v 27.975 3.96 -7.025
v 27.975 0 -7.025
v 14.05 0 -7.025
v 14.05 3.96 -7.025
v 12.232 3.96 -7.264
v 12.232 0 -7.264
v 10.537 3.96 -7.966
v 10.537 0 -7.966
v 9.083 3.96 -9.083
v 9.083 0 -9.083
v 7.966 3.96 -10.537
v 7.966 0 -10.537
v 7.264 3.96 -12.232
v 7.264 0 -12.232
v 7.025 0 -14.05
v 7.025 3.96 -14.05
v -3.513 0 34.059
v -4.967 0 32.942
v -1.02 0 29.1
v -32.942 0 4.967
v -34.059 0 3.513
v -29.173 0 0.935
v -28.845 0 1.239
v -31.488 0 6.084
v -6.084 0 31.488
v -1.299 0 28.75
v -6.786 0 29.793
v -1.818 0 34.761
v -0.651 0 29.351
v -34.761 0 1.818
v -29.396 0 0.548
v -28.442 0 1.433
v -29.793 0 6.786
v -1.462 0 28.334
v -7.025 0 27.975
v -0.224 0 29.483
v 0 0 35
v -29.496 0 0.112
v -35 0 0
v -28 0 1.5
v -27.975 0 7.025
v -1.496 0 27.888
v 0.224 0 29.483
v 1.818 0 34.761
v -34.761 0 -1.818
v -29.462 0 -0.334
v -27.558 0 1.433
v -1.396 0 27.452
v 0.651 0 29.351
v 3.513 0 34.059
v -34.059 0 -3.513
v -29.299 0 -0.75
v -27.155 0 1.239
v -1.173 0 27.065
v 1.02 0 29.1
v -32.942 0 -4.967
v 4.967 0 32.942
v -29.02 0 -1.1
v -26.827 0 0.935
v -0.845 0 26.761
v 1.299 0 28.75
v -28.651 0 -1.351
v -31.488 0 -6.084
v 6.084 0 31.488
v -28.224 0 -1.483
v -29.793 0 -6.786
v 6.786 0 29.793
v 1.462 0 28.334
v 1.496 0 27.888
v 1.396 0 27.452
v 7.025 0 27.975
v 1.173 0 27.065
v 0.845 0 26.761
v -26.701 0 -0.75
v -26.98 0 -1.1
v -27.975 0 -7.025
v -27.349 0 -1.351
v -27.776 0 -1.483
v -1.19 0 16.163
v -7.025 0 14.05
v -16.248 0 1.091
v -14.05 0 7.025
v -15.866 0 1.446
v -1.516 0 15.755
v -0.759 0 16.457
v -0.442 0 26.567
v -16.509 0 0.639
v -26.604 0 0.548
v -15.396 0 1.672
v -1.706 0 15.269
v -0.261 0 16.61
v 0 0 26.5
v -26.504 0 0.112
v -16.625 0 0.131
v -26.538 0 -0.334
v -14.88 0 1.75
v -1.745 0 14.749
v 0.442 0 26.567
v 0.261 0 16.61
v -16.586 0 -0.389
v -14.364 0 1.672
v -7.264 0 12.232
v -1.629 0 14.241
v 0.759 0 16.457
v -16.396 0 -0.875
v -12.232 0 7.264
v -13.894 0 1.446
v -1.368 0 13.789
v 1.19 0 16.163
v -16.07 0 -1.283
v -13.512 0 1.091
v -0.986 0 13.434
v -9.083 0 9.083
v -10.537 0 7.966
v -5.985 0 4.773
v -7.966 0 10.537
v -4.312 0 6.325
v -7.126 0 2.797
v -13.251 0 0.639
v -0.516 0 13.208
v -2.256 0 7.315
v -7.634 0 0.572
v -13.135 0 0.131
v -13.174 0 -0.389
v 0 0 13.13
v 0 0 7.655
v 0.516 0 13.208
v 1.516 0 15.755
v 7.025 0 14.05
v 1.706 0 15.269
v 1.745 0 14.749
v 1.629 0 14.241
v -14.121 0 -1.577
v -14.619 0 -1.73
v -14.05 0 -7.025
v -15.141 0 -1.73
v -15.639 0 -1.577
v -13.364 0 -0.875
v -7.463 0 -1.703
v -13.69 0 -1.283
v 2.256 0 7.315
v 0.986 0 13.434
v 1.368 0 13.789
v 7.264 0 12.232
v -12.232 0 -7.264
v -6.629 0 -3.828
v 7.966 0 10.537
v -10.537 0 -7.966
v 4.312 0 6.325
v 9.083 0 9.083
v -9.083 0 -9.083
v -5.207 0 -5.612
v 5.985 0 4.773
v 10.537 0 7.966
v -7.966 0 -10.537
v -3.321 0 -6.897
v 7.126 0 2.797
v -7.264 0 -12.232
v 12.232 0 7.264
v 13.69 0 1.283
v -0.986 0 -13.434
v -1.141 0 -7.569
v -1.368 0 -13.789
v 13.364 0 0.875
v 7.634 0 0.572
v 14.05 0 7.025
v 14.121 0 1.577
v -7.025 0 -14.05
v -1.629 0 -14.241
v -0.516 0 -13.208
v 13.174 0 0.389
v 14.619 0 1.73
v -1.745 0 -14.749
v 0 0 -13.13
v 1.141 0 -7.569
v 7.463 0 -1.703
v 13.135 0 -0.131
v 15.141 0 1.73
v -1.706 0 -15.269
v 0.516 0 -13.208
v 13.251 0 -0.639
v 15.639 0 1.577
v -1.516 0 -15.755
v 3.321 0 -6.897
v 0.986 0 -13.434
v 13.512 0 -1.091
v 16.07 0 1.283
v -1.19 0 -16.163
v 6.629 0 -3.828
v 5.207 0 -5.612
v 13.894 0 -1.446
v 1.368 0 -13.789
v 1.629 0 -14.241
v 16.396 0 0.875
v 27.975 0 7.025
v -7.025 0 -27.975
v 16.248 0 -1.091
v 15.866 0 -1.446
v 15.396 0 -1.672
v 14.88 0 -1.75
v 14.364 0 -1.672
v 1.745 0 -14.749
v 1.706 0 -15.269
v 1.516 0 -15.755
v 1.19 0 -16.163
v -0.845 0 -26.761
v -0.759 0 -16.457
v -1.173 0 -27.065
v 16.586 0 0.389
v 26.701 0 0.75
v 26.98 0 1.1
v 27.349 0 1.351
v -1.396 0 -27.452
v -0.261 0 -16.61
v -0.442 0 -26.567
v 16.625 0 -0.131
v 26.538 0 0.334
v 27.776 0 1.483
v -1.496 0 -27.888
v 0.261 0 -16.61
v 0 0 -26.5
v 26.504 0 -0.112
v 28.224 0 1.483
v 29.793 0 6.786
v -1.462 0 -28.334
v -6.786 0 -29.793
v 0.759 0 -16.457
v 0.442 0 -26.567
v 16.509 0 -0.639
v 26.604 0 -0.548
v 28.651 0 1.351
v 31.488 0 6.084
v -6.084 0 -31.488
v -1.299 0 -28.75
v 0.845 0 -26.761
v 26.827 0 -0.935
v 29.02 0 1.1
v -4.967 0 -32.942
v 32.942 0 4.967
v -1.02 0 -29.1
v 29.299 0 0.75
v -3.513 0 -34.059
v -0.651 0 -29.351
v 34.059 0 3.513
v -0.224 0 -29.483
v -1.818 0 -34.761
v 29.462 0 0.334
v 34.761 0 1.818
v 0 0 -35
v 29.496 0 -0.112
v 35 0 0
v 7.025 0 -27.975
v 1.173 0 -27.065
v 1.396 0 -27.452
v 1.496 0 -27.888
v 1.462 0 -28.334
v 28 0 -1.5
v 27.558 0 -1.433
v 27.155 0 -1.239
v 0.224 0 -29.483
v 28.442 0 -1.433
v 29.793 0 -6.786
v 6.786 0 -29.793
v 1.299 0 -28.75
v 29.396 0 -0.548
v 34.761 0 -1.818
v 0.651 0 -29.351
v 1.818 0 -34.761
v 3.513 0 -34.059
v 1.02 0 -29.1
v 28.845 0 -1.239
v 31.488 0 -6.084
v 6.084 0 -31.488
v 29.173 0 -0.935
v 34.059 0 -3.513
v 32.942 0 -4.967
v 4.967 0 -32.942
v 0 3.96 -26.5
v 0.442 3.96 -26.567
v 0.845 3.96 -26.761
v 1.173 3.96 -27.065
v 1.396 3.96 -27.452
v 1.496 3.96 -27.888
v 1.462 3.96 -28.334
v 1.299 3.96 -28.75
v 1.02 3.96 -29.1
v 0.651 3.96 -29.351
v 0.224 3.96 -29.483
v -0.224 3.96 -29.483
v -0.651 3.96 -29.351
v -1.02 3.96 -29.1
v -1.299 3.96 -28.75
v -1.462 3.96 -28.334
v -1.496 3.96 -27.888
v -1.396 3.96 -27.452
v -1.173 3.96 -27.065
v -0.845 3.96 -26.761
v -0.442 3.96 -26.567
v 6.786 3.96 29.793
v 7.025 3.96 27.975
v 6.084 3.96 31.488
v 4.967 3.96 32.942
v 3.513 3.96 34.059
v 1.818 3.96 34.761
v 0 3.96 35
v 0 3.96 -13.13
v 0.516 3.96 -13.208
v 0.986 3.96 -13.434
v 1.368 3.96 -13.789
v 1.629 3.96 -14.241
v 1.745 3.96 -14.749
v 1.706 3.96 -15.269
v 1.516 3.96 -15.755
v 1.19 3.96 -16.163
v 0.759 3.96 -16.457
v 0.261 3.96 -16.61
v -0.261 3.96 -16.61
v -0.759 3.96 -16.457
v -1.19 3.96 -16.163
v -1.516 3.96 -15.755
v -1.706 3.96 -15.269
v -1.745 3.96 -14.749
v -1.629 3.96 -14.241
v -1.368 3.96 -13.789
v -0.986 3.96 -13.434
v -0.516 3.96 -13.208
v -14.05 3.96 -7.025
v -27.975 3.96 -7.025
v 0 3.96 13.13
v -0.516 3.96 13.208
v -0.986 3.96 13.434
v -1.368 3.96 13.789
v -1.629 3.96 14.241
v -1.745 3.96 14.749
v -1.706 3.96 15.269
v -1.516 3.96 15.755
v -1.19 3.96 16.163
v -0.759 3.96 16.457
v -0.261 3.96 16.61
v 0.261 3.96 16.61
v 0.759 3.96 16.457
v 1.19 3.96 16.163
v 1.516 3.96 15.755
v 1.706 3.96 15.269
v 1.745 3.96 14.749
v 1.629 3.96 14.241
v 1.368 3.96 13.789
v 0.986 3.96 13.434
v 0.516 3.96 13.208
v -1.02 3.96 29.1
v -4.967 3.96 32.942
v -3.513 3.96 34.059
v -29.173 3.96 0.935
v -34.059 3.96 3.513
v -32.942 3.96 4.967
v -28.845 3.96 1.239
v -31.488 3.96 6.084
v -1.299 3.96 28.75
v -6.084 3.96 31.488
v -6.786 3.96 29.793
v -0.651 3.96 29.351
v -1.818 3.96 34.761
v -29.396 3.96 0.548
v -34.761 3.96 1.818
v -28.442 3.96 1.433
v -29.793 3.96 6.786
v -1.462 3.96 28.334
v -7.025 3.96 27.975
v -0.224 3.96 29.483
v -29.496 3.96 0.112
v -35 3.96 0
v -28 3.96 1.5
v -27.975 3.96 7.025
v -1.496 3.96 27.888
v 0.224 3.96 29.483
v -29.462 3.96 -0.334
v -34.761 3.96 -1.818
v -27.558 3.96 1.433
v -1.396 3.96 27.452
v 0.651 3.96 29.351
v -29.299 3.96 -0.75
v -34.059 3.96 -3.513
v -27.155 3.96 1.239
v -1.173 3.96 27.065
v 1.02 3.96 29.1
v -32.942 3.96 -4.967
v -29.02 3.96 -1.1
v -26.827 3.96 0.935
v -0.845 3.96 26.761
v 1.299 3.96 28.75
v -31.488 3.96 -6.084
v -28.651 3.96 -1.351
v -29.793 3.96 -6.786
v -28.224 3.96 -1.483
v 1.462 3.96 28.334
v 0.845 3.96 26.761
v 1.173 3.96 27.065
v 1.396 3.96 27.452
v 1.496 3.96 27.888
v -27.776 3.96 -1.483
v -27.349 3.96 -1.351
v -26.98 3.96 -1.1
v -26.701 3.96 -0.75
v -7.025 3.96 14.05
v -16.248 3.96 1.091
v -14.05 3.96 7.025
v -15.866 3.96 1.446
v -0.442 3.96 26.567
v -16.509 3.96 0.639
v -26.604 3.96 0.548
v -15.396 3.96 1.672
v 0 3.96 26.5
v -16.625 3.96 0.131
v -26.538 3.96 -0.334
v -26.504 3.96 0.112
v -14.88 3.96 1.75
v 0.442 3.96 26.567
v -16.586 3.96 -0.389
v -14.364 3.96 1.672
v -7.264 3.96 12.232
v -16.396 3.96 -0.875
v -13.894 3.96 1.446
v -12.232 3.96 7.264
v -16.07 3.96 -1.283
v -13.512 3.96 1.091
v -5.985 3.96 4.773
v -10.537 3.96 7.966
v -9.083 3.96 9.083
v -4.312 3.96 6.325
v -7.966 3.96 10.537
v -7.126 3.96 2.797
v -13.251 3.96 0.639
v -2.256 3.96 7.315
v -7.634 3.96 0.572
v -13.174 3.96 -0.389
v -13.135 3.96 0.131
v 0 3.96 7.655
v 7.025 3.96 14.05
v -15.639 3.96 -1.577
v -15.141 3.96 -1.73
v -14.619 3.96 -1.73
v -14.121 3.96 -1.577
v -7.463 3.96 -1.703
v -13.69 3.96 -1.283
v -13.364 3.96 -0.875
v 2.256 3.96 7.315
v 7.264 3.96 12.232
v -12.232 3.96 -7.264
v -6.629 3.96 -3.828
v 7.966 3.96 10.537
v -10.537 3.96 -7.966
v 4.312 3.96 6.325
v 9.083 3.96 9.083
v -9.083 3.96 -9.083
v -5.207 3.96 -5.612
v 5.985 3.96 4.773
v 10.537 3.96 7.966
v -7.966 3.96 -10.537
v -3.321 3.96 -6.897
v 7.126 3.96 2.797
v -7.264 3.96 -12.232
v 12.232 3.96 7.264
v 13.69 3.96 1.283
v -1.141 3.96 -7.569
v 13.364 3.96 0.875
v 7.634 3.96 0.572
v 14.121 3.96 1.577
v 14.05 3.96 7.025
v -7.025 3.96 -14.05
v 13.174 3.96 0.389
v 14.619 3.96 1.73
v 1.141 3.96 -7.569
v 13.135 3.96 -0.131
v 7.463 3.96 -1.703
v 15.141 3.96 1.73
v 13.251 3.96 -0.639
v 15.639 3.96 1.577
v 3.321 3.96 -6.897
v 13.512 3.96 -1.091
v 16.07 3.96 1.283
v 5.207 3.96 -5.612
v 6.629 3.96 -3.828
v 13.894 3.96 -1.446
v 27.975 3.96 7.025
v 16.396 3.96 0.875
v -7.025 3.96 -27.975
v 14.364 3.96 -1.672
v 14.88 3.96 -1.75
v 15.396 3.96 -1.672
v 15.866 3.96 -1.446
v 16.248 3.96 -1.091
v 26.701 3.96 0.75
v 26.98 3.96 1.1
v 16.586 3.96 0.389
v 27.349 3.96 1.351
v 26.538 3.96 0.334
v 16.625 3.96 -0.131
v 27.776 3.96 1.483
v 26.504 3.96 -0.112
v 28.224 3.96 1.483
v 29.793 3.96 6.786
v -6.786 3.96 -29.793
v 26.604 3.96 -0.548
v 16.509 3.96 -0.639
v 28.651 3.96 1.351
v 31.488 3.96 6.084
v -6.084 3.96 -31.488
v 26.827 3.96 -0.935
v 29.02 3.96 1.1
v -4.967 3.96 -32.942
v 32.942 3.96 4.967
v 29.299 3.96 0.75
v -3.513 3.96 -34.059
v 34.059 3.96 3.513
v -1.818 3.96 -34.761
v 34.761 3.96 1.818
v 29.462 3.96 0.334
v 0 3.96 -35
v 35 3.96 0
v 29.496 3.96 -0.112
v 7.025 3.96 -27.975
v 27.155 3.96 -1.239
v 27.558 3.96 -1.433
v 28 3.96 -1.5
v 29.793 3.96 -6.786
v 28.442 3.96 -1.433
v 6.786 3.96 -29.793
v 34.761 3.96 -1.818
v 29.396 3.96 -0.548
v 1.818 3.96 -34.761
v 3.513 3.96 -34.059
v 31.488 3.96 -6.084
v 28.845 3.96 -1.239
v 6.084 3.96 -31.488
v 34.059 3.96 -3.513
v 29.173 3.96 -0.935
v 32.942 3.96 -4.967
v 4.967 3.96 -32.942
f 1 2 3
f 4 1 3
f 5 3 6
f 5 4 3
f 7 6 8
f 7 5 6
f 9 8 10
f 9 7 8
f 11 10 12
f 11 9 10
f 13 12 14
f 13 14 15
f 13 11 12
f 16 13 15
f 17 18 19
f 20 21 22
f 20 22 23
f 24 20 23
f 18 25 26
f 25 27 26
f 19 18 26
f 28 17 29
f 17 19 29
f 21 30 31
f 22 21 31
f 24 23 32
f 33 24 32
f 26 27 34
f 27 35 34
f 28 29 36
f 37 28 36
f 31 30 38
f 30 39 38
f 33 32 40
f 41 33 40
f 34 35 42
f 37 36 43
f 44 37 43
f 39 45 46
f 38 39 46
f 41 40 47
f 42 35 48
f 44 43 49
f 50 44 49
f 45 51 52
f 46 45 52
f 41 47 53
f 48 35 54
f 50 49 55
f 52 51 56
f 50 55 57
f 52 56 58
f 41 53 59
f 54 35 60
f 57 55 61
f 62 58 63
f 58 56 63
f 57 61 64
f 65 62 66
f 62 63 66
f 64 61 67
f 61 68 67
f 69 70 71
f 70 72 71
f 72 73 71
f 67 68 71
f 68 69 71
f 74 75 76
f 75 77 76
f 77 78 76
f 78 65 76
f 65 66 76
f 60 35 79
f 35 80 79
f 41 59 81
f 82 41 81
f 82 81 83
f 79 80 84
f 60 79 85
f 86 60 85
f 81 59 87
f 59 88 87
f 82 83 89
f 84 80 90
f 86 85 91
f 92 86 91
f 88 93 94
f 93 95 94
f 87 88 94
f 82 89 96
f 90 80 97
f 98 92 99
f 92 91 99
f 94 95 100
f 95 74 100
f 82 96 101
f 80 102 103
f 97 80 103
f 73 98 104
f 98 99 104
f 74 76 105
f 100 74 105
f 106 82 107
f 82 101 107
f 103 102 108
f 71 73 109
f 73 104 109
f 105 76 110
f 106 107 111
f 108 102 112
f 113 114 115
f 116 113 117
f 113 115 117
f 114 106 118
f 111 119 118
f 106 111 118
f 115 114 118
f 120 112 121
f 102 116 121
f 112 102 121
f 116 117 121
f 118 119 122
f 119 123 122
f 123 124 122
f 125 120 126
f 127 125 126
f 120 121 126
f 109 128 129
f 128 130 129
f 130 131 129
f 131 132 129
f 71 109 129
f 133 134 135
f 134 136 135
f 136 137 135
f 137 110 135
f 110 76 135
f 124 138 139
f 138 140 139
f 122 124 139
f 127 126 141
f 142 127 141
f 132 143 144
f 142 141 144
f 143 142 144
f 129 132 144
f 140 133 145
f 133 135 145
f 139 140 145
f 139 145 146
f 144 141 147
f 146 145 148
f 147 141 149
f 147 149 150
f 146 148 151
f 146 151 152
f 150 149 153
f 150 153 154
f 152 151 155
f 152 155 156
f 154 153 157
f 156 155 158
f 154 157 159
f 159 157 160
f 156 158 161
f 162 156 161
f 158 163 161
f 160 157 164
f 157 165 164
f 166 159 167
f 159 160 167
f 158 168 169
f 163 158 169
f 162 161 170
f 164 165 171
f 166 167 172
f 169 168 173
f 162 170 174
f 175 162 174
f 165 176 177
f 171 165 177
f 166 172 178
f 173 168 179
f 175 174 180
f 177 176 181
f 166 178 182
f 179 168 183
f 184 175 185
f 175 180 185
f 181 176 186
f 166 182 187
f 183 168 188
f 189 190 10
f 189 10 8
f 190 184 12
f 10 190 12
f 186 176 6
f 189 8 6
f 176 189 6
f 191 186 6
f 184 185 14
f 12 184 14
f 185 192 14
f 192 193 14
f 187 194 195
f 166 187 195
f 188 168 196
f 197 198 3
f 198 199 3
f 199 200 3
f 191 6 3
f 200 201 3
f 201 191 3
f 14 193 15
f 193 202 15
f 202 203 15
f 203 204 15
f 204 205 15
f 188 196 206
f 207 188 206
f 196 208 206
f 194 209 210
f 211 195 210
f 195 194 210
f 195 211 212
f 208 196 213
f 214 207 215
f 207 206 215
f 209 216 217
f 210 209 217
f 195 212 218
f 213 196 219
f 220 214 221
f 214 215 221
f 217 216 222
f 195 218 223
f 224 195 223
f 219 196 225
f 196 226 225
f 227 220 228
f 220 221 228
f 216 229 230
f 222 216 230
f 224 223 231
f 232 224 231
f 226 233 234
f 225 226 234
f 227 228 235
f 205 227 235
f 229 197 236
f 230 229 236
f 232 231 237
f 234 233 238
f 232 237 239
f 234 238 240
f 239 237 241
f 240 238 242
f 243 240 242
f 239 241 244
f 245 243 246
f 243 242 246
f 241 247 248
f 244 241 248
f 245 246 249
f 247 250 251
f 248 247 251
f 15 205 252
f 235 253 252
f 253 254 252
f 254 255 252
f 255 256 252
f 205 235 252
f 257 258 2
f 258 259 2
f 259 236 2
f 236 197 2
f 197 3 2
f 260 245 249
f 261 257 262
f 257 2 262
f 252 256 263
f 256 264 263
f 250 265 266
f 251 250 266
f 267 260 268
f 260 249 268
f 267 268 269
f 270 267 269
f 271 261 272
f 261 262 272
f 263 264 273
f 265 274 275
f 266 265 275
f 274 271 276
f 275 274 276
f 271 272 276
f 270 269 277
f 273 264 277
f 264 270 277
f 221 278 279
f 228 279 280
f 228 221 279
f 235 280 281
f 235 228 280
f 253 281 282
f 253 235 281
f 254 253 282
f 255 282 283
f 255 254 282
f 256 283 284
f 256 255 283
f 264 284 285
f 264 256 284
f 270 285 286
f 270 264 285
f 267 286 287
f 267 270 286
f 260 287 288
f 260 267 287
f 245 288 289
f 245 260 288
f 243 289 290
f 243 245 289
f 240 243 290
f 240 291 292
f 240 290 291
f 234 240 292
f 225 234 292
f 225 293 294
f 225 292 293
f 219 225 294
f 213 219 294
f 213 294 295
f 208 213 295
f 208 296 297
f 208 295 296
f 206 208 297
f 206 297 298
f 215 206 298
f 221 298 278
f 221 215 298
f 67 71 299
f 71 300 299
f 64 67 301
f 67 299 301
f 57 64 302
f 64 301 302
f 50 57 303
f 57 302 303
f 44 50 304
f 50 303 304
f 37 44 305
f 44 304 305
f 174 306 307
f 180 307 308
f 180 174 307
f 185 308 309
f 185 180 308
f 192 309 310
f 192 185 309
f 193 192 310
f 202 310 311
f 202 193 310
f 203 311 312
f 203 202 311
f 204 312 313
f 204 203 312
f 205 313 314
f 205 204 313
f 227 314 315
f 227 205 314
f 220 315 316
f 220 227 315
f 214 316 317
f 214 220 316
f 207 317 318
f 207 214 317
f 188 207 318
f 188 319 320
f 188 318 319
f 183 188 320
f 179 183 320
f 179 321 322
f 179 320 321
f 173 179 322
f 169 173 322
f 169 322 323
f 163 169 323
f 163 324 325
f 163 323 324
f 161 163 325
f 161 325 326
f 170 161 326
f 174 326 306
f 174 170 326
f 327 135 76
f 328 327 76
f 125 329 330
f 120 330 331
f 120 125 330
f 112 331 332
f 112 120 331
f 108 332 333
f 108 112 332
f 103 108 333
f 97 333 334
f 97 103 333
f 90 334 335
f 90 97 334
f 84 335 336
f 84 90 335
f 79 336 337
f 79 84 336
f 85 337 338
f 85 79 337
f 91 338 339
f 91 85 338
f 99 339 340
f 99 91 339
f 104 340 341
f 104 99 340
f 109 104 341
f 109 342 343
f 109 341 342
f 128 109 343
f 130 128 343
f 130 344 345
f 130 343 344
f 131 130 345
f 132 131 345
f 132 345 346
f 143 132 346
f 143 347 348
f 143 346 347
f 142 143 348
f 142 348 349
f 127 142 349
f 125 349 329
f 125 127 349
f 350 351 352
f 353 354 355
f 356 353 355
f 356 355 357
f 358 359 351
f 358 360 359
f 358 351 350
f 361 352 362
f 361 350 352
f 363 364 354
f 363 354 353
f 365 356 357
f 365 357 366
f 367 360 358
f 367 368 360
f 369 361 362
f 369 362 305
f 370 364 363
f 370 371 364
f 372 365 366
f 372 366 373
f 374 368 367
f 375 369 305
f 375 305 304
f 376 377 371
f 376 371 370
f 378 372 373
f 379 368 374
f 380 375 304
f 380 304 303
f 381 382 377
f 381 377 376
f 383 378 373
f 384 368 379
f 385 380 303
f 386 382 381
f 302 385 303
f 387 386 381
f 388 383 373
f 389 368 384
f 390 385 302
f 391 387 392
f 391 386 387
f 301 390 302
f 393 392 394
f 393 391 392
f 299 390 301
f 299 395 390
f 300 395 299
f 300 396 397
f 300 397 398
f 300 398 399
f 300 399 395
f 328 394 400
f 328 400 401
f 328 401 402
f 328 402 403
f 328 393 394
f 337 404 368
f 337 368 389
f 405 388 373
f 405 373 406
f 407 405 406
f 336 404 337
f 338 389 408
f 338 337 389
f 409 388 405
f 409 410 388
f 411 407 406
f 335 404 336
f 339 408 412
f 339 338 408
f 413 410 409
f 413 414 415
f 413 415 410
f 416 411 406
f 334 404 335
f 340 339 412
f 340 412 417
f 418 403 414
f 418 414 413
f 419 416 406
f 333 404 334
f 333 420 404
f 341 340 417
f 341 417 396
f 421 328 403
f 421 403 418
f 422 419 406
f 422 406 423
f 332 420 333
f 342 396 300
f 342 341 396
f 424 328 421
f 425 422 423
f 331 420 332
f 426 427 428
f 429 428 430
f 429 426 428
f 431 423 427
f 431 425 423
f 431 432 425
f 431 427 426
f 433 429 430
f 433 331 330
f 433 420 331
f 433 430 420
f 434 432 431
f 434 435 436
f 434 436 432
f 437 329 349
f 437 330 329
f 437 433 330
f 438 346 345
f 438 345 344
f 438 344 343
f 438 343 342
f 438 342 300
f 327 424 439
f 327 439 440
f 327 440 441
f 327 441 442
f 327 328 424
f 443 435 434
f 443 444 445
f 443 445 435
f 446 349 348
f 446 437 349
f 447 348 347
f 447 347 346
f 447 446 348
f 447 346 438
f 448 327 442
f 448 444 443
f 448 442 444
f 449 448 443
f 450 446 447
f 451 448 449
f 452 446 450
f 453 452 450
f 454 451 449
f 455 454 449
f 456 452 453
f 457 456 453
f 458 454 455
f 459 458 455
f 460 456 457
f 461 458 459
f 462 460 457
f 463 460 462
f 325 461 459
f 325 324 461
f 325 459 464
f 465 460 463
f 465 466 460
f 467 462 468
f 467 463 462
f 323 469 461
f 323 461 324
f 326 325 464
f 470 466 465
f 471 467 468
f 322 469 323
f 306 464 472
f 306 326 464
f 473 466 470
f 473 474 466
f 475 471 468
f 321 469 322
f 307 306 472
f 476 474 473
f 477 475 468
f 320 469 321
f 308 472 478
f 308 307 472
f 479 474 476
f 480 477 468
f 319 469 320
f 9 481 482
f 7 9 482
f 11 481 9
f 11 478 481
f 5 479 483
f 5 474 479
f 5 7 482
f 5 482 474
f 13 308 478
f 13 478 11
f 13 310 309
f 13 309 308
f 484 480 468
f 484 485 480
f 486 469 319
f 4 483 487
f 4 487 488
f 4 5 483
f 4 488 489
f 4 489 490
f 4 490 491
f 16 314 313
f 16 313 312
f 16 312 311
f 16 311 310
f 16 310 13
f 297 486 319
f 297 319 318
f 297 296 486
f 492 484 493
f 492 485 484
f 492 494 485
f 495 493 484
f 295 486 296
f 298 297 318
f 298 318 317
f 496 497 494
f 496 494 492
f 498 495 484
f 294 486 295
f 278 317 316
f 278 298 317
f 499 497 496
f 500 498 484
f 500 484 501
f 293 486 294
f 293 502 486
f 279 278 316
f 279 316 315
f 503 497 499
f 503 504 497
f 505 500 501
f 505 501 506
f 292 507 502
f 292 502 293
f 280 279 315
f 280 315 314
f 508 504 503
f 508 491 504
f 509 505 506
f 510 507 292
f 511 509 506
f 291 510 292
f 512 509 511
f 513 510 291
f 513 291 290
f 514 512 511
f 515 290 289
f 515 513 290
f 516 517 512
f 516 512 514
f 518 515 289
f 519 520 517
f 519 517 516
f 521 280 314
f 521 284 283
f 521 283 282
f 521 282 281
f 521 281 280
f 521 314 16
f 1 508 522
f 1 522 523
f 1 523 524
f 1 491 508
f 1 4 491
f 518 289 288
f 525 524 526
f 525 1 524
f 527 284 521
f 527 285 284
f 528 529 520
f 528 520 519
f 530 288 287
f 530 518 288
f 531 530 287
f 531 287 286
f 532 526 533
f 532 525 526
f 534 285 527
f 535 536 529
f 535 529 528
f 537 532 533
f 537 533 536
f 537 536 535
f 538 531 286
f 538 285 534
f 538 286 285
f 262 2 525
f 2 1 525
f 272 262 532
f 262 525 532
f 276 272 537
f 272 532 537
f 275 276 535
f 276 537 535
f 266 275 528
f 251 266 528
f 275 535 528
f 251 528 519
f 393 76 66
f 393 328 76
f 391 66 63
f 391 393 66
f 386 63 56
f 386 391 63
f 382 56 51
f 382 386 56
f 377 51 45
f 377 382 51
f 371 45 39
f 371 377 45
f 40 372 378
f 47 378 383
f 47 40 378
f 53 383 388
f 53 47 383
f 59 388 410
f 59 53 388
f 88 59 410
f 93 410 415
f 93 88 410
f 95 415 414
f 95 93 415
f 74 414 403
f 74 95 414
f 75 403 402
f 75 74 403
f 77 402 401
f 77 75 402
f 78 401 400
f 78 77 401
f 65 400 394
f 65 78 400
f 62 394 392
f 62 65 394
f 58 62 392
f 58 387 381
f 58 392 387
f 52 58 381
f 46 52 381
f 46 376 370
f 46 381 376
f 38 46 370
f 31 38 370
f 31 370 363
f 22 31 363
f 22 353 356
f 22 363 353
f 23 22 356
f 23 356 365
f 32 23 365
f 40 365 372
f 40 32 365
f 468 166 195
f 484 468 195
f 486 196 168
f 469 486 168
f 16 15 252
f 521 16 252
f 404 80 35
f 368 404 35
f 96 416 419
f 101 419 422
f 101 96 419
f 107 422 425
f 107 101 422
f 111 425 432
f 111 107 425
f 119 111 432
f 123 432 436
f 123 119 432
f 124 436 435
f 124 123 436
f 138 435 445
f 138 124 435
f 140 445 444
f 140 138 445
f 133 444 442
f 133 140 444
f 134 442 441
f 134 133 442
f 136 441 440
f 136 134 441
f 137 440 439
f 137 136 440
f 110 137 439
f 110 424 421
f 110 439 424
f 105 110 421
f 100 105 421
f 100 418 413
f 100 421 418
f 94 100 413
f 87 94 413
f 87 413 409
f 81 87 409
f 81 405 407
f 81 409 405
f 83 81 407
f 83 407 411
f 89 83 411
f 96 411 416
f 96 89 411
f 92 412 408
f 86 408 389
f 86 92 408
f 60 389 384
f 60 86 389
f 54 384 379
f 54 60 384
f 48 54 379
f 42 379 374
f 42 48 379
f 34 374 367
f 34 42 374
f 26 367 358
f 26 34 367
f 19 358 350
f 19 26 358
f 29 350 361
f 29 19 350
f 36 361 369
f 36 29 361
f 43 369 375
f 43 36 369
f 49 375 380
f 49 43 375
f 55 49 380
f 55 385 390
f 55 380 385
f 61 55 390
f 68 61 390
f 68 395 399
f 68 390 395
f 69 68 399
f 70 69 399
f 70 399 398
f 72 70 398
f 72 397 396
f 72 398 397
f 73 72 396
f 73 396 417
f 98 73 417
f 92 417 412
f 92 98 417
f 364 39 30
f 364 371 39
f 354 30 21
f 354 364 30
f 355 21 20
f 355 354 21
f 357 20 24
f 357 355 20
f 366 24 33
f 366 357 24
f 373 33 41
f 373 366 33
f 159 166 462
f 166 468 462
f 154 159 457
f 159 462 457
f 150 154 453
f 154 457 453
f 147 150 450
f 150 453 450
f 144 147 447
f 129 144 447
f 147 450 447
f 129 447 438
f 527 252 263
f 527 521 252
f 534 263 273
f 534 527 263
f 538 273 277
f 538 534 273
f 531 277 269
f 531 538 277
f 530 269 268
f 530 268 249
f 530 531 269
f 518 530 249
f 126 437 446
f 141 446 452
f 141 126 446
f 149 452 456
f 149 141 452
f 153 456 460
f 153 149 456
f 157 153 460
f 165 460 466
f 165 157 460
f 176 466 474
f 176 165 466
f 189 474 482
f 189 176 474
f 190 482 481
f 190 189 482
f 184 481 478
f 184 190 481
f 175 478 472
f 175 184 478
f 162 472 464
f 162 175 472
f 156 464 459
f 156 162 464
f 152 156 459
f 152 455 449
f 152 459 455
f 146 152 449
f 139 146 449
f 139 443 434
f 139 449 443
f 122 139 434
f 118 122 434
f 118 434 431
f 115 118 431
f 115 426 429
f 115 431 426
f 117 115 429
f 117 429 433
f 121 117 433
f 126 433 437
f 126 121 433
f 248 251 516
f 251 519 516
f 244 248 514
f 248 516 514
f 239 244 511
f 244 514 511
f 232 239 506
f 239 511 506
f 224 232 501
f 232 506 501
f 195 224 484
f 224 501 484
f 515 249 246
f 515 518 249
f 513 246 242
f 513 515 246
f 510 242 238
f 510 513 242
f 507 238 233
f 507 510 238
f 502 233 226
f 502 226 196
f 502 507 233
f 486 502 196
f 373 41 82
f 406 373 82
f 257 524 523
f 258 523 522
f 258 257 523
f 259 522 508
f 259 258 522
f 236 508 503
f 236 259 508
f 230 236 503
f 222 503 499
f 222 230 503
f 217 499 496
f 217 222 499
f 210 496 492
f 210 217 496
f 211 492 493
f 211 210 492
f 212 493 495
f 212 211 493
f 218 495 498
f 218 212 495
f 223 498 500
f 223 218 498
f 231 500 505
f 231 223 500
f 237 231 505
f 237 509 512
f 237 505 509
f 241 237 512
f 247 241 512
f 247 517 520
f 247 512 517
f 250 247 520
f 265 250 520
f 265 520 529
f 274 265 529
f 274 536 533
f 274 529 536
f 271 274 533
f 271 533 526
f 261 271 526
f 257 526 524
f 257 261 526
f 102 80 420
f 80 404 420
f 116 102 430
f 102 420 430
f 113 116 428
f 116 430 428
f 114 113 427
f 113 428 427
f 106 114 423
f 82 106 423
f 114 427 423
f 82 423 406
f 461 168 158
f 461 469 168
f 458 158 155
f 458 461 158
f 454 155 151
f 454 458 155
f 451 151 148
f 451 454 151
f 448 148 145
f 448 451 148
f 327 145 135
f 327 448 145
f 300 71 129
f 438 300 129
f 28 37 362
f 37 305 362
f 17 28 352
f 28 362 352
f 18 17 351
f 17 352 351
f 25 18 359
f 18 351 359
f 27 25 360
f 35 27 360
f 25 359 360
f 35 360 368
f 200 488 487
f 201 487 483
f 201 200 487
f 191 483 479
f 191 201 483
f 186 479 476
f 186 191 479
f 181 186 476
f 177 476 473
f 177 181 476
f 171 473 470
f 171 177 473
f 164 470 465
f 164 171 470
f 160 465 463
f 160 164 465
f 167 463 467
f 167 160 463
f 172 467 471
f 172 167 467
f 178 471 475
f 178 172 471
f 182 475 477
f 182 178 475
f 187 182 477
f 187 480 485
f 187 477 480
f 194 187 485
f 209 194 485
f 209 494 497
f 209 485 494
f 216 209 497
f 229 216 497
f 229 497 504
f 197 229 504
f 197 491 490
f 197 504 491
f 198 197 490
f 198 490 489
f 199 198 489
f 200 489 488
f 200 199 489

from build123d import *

# Parameters (mm, degrees)
BOSS_EXTRUDE1_DEPTH = 3.96
SKETCH3_R           = 7.655
SKETCH3_R_2         = 1.75
SKETCH3_R_3         = 1.5
CUT_EXTRUDE1_DEPTH  = 50.655630094
FILLET2_R           = 7.025


with BuildPart() as part:
    # Sketch1 → Boss-Extrude1 (new body)
    with BuildSketch(Plane(origin=(0, 0, 0), x_dir=(1, 0, 0), z_dir=(0, 1, 0))):
        Polygon((35, 7.025), (7.025, 7.025), (7.025, 35), (-7.025, 35), (-7.025, 7.025), (-35, 7.025), (-35, -7.025), (-7.025, -7.025), (-7.025, -35), (7.025, -35), (7.025, -7.025), (35, -7.025), align=None)
    extrude(amount=BOSS_EXTRUDE1_DEPTH)

    # Sketch3 → Cut-Extrude1 (cut, through all)
    with BuildSketch(Plane(origin=(0, 0, 0), x_dir=(1, 0, 0), z_dir=(0, 1, 0))):
        with Locations(Location((0, 0, 0), (0, 0, 270))):
            Circle(SKETCH3_R)
        with Locations(Location((-14.88, 0, 0), (0, 0, 270))):
            Circle(SKETCH3_R_2)
        with Locations(Location((-28, 0, 0), (0, 0, 270))):
            Circle(SKETCH3_R_3)
        with Locations(Location((28, 0, 0), (0, 0, 90))):
            Circle(SKETCH3_R_3)
        with Locations(Location((14.88, 0, 0), (0, 0, 90))):
            Circle(SKETCH3_R_2)
        with Locations(Location((0, 14.88, 0), (0, 0, 270))):
            Circle(SKETCH3_R_2)
        with Locations(Location((0, 28, 0), (0, 0, 270))):
            Circle(SKETCH3_R_3)
        with Locations(Location((0, -28, 0), (0, 0, 90))):
            Circle(SKETCH3_R_3)
        with Locations(Location((0, -14.88, 0), (0, 0, 90))):
            Circle(SKETCH3_R_2)
    extrude(amount=CUT_EXTRUDE1_DEPTH, mode=Mode.SUBTRACT)

    # Fillet2
    fillet2_edges = [part.edges().sort_by_distance(p)[0] for p in [
        (7.025, 1.98, 7.025),
        (7.025, 1.98, -7.025),
        (-7.025, 1.98, -7.025),
        (-7.025, 1.98, 7.025),
        (35, 1.98, -7.025),
        (35, 1.98, 7.025),
        (7.025, 1.98, 35),
        (-7.025, 1.98, 35),
        (-35, 1.98, 7.025),
        (-35, 1.98, -7.025),
        (7.025, 1.98, -35),
        (-7.025, 1.98, -35),
    ]]
    fillet(fillet2_edges, radius=FILLET2_R - 0.0001)  # a hair under: the kernel refuses the full size


solid = part.part
